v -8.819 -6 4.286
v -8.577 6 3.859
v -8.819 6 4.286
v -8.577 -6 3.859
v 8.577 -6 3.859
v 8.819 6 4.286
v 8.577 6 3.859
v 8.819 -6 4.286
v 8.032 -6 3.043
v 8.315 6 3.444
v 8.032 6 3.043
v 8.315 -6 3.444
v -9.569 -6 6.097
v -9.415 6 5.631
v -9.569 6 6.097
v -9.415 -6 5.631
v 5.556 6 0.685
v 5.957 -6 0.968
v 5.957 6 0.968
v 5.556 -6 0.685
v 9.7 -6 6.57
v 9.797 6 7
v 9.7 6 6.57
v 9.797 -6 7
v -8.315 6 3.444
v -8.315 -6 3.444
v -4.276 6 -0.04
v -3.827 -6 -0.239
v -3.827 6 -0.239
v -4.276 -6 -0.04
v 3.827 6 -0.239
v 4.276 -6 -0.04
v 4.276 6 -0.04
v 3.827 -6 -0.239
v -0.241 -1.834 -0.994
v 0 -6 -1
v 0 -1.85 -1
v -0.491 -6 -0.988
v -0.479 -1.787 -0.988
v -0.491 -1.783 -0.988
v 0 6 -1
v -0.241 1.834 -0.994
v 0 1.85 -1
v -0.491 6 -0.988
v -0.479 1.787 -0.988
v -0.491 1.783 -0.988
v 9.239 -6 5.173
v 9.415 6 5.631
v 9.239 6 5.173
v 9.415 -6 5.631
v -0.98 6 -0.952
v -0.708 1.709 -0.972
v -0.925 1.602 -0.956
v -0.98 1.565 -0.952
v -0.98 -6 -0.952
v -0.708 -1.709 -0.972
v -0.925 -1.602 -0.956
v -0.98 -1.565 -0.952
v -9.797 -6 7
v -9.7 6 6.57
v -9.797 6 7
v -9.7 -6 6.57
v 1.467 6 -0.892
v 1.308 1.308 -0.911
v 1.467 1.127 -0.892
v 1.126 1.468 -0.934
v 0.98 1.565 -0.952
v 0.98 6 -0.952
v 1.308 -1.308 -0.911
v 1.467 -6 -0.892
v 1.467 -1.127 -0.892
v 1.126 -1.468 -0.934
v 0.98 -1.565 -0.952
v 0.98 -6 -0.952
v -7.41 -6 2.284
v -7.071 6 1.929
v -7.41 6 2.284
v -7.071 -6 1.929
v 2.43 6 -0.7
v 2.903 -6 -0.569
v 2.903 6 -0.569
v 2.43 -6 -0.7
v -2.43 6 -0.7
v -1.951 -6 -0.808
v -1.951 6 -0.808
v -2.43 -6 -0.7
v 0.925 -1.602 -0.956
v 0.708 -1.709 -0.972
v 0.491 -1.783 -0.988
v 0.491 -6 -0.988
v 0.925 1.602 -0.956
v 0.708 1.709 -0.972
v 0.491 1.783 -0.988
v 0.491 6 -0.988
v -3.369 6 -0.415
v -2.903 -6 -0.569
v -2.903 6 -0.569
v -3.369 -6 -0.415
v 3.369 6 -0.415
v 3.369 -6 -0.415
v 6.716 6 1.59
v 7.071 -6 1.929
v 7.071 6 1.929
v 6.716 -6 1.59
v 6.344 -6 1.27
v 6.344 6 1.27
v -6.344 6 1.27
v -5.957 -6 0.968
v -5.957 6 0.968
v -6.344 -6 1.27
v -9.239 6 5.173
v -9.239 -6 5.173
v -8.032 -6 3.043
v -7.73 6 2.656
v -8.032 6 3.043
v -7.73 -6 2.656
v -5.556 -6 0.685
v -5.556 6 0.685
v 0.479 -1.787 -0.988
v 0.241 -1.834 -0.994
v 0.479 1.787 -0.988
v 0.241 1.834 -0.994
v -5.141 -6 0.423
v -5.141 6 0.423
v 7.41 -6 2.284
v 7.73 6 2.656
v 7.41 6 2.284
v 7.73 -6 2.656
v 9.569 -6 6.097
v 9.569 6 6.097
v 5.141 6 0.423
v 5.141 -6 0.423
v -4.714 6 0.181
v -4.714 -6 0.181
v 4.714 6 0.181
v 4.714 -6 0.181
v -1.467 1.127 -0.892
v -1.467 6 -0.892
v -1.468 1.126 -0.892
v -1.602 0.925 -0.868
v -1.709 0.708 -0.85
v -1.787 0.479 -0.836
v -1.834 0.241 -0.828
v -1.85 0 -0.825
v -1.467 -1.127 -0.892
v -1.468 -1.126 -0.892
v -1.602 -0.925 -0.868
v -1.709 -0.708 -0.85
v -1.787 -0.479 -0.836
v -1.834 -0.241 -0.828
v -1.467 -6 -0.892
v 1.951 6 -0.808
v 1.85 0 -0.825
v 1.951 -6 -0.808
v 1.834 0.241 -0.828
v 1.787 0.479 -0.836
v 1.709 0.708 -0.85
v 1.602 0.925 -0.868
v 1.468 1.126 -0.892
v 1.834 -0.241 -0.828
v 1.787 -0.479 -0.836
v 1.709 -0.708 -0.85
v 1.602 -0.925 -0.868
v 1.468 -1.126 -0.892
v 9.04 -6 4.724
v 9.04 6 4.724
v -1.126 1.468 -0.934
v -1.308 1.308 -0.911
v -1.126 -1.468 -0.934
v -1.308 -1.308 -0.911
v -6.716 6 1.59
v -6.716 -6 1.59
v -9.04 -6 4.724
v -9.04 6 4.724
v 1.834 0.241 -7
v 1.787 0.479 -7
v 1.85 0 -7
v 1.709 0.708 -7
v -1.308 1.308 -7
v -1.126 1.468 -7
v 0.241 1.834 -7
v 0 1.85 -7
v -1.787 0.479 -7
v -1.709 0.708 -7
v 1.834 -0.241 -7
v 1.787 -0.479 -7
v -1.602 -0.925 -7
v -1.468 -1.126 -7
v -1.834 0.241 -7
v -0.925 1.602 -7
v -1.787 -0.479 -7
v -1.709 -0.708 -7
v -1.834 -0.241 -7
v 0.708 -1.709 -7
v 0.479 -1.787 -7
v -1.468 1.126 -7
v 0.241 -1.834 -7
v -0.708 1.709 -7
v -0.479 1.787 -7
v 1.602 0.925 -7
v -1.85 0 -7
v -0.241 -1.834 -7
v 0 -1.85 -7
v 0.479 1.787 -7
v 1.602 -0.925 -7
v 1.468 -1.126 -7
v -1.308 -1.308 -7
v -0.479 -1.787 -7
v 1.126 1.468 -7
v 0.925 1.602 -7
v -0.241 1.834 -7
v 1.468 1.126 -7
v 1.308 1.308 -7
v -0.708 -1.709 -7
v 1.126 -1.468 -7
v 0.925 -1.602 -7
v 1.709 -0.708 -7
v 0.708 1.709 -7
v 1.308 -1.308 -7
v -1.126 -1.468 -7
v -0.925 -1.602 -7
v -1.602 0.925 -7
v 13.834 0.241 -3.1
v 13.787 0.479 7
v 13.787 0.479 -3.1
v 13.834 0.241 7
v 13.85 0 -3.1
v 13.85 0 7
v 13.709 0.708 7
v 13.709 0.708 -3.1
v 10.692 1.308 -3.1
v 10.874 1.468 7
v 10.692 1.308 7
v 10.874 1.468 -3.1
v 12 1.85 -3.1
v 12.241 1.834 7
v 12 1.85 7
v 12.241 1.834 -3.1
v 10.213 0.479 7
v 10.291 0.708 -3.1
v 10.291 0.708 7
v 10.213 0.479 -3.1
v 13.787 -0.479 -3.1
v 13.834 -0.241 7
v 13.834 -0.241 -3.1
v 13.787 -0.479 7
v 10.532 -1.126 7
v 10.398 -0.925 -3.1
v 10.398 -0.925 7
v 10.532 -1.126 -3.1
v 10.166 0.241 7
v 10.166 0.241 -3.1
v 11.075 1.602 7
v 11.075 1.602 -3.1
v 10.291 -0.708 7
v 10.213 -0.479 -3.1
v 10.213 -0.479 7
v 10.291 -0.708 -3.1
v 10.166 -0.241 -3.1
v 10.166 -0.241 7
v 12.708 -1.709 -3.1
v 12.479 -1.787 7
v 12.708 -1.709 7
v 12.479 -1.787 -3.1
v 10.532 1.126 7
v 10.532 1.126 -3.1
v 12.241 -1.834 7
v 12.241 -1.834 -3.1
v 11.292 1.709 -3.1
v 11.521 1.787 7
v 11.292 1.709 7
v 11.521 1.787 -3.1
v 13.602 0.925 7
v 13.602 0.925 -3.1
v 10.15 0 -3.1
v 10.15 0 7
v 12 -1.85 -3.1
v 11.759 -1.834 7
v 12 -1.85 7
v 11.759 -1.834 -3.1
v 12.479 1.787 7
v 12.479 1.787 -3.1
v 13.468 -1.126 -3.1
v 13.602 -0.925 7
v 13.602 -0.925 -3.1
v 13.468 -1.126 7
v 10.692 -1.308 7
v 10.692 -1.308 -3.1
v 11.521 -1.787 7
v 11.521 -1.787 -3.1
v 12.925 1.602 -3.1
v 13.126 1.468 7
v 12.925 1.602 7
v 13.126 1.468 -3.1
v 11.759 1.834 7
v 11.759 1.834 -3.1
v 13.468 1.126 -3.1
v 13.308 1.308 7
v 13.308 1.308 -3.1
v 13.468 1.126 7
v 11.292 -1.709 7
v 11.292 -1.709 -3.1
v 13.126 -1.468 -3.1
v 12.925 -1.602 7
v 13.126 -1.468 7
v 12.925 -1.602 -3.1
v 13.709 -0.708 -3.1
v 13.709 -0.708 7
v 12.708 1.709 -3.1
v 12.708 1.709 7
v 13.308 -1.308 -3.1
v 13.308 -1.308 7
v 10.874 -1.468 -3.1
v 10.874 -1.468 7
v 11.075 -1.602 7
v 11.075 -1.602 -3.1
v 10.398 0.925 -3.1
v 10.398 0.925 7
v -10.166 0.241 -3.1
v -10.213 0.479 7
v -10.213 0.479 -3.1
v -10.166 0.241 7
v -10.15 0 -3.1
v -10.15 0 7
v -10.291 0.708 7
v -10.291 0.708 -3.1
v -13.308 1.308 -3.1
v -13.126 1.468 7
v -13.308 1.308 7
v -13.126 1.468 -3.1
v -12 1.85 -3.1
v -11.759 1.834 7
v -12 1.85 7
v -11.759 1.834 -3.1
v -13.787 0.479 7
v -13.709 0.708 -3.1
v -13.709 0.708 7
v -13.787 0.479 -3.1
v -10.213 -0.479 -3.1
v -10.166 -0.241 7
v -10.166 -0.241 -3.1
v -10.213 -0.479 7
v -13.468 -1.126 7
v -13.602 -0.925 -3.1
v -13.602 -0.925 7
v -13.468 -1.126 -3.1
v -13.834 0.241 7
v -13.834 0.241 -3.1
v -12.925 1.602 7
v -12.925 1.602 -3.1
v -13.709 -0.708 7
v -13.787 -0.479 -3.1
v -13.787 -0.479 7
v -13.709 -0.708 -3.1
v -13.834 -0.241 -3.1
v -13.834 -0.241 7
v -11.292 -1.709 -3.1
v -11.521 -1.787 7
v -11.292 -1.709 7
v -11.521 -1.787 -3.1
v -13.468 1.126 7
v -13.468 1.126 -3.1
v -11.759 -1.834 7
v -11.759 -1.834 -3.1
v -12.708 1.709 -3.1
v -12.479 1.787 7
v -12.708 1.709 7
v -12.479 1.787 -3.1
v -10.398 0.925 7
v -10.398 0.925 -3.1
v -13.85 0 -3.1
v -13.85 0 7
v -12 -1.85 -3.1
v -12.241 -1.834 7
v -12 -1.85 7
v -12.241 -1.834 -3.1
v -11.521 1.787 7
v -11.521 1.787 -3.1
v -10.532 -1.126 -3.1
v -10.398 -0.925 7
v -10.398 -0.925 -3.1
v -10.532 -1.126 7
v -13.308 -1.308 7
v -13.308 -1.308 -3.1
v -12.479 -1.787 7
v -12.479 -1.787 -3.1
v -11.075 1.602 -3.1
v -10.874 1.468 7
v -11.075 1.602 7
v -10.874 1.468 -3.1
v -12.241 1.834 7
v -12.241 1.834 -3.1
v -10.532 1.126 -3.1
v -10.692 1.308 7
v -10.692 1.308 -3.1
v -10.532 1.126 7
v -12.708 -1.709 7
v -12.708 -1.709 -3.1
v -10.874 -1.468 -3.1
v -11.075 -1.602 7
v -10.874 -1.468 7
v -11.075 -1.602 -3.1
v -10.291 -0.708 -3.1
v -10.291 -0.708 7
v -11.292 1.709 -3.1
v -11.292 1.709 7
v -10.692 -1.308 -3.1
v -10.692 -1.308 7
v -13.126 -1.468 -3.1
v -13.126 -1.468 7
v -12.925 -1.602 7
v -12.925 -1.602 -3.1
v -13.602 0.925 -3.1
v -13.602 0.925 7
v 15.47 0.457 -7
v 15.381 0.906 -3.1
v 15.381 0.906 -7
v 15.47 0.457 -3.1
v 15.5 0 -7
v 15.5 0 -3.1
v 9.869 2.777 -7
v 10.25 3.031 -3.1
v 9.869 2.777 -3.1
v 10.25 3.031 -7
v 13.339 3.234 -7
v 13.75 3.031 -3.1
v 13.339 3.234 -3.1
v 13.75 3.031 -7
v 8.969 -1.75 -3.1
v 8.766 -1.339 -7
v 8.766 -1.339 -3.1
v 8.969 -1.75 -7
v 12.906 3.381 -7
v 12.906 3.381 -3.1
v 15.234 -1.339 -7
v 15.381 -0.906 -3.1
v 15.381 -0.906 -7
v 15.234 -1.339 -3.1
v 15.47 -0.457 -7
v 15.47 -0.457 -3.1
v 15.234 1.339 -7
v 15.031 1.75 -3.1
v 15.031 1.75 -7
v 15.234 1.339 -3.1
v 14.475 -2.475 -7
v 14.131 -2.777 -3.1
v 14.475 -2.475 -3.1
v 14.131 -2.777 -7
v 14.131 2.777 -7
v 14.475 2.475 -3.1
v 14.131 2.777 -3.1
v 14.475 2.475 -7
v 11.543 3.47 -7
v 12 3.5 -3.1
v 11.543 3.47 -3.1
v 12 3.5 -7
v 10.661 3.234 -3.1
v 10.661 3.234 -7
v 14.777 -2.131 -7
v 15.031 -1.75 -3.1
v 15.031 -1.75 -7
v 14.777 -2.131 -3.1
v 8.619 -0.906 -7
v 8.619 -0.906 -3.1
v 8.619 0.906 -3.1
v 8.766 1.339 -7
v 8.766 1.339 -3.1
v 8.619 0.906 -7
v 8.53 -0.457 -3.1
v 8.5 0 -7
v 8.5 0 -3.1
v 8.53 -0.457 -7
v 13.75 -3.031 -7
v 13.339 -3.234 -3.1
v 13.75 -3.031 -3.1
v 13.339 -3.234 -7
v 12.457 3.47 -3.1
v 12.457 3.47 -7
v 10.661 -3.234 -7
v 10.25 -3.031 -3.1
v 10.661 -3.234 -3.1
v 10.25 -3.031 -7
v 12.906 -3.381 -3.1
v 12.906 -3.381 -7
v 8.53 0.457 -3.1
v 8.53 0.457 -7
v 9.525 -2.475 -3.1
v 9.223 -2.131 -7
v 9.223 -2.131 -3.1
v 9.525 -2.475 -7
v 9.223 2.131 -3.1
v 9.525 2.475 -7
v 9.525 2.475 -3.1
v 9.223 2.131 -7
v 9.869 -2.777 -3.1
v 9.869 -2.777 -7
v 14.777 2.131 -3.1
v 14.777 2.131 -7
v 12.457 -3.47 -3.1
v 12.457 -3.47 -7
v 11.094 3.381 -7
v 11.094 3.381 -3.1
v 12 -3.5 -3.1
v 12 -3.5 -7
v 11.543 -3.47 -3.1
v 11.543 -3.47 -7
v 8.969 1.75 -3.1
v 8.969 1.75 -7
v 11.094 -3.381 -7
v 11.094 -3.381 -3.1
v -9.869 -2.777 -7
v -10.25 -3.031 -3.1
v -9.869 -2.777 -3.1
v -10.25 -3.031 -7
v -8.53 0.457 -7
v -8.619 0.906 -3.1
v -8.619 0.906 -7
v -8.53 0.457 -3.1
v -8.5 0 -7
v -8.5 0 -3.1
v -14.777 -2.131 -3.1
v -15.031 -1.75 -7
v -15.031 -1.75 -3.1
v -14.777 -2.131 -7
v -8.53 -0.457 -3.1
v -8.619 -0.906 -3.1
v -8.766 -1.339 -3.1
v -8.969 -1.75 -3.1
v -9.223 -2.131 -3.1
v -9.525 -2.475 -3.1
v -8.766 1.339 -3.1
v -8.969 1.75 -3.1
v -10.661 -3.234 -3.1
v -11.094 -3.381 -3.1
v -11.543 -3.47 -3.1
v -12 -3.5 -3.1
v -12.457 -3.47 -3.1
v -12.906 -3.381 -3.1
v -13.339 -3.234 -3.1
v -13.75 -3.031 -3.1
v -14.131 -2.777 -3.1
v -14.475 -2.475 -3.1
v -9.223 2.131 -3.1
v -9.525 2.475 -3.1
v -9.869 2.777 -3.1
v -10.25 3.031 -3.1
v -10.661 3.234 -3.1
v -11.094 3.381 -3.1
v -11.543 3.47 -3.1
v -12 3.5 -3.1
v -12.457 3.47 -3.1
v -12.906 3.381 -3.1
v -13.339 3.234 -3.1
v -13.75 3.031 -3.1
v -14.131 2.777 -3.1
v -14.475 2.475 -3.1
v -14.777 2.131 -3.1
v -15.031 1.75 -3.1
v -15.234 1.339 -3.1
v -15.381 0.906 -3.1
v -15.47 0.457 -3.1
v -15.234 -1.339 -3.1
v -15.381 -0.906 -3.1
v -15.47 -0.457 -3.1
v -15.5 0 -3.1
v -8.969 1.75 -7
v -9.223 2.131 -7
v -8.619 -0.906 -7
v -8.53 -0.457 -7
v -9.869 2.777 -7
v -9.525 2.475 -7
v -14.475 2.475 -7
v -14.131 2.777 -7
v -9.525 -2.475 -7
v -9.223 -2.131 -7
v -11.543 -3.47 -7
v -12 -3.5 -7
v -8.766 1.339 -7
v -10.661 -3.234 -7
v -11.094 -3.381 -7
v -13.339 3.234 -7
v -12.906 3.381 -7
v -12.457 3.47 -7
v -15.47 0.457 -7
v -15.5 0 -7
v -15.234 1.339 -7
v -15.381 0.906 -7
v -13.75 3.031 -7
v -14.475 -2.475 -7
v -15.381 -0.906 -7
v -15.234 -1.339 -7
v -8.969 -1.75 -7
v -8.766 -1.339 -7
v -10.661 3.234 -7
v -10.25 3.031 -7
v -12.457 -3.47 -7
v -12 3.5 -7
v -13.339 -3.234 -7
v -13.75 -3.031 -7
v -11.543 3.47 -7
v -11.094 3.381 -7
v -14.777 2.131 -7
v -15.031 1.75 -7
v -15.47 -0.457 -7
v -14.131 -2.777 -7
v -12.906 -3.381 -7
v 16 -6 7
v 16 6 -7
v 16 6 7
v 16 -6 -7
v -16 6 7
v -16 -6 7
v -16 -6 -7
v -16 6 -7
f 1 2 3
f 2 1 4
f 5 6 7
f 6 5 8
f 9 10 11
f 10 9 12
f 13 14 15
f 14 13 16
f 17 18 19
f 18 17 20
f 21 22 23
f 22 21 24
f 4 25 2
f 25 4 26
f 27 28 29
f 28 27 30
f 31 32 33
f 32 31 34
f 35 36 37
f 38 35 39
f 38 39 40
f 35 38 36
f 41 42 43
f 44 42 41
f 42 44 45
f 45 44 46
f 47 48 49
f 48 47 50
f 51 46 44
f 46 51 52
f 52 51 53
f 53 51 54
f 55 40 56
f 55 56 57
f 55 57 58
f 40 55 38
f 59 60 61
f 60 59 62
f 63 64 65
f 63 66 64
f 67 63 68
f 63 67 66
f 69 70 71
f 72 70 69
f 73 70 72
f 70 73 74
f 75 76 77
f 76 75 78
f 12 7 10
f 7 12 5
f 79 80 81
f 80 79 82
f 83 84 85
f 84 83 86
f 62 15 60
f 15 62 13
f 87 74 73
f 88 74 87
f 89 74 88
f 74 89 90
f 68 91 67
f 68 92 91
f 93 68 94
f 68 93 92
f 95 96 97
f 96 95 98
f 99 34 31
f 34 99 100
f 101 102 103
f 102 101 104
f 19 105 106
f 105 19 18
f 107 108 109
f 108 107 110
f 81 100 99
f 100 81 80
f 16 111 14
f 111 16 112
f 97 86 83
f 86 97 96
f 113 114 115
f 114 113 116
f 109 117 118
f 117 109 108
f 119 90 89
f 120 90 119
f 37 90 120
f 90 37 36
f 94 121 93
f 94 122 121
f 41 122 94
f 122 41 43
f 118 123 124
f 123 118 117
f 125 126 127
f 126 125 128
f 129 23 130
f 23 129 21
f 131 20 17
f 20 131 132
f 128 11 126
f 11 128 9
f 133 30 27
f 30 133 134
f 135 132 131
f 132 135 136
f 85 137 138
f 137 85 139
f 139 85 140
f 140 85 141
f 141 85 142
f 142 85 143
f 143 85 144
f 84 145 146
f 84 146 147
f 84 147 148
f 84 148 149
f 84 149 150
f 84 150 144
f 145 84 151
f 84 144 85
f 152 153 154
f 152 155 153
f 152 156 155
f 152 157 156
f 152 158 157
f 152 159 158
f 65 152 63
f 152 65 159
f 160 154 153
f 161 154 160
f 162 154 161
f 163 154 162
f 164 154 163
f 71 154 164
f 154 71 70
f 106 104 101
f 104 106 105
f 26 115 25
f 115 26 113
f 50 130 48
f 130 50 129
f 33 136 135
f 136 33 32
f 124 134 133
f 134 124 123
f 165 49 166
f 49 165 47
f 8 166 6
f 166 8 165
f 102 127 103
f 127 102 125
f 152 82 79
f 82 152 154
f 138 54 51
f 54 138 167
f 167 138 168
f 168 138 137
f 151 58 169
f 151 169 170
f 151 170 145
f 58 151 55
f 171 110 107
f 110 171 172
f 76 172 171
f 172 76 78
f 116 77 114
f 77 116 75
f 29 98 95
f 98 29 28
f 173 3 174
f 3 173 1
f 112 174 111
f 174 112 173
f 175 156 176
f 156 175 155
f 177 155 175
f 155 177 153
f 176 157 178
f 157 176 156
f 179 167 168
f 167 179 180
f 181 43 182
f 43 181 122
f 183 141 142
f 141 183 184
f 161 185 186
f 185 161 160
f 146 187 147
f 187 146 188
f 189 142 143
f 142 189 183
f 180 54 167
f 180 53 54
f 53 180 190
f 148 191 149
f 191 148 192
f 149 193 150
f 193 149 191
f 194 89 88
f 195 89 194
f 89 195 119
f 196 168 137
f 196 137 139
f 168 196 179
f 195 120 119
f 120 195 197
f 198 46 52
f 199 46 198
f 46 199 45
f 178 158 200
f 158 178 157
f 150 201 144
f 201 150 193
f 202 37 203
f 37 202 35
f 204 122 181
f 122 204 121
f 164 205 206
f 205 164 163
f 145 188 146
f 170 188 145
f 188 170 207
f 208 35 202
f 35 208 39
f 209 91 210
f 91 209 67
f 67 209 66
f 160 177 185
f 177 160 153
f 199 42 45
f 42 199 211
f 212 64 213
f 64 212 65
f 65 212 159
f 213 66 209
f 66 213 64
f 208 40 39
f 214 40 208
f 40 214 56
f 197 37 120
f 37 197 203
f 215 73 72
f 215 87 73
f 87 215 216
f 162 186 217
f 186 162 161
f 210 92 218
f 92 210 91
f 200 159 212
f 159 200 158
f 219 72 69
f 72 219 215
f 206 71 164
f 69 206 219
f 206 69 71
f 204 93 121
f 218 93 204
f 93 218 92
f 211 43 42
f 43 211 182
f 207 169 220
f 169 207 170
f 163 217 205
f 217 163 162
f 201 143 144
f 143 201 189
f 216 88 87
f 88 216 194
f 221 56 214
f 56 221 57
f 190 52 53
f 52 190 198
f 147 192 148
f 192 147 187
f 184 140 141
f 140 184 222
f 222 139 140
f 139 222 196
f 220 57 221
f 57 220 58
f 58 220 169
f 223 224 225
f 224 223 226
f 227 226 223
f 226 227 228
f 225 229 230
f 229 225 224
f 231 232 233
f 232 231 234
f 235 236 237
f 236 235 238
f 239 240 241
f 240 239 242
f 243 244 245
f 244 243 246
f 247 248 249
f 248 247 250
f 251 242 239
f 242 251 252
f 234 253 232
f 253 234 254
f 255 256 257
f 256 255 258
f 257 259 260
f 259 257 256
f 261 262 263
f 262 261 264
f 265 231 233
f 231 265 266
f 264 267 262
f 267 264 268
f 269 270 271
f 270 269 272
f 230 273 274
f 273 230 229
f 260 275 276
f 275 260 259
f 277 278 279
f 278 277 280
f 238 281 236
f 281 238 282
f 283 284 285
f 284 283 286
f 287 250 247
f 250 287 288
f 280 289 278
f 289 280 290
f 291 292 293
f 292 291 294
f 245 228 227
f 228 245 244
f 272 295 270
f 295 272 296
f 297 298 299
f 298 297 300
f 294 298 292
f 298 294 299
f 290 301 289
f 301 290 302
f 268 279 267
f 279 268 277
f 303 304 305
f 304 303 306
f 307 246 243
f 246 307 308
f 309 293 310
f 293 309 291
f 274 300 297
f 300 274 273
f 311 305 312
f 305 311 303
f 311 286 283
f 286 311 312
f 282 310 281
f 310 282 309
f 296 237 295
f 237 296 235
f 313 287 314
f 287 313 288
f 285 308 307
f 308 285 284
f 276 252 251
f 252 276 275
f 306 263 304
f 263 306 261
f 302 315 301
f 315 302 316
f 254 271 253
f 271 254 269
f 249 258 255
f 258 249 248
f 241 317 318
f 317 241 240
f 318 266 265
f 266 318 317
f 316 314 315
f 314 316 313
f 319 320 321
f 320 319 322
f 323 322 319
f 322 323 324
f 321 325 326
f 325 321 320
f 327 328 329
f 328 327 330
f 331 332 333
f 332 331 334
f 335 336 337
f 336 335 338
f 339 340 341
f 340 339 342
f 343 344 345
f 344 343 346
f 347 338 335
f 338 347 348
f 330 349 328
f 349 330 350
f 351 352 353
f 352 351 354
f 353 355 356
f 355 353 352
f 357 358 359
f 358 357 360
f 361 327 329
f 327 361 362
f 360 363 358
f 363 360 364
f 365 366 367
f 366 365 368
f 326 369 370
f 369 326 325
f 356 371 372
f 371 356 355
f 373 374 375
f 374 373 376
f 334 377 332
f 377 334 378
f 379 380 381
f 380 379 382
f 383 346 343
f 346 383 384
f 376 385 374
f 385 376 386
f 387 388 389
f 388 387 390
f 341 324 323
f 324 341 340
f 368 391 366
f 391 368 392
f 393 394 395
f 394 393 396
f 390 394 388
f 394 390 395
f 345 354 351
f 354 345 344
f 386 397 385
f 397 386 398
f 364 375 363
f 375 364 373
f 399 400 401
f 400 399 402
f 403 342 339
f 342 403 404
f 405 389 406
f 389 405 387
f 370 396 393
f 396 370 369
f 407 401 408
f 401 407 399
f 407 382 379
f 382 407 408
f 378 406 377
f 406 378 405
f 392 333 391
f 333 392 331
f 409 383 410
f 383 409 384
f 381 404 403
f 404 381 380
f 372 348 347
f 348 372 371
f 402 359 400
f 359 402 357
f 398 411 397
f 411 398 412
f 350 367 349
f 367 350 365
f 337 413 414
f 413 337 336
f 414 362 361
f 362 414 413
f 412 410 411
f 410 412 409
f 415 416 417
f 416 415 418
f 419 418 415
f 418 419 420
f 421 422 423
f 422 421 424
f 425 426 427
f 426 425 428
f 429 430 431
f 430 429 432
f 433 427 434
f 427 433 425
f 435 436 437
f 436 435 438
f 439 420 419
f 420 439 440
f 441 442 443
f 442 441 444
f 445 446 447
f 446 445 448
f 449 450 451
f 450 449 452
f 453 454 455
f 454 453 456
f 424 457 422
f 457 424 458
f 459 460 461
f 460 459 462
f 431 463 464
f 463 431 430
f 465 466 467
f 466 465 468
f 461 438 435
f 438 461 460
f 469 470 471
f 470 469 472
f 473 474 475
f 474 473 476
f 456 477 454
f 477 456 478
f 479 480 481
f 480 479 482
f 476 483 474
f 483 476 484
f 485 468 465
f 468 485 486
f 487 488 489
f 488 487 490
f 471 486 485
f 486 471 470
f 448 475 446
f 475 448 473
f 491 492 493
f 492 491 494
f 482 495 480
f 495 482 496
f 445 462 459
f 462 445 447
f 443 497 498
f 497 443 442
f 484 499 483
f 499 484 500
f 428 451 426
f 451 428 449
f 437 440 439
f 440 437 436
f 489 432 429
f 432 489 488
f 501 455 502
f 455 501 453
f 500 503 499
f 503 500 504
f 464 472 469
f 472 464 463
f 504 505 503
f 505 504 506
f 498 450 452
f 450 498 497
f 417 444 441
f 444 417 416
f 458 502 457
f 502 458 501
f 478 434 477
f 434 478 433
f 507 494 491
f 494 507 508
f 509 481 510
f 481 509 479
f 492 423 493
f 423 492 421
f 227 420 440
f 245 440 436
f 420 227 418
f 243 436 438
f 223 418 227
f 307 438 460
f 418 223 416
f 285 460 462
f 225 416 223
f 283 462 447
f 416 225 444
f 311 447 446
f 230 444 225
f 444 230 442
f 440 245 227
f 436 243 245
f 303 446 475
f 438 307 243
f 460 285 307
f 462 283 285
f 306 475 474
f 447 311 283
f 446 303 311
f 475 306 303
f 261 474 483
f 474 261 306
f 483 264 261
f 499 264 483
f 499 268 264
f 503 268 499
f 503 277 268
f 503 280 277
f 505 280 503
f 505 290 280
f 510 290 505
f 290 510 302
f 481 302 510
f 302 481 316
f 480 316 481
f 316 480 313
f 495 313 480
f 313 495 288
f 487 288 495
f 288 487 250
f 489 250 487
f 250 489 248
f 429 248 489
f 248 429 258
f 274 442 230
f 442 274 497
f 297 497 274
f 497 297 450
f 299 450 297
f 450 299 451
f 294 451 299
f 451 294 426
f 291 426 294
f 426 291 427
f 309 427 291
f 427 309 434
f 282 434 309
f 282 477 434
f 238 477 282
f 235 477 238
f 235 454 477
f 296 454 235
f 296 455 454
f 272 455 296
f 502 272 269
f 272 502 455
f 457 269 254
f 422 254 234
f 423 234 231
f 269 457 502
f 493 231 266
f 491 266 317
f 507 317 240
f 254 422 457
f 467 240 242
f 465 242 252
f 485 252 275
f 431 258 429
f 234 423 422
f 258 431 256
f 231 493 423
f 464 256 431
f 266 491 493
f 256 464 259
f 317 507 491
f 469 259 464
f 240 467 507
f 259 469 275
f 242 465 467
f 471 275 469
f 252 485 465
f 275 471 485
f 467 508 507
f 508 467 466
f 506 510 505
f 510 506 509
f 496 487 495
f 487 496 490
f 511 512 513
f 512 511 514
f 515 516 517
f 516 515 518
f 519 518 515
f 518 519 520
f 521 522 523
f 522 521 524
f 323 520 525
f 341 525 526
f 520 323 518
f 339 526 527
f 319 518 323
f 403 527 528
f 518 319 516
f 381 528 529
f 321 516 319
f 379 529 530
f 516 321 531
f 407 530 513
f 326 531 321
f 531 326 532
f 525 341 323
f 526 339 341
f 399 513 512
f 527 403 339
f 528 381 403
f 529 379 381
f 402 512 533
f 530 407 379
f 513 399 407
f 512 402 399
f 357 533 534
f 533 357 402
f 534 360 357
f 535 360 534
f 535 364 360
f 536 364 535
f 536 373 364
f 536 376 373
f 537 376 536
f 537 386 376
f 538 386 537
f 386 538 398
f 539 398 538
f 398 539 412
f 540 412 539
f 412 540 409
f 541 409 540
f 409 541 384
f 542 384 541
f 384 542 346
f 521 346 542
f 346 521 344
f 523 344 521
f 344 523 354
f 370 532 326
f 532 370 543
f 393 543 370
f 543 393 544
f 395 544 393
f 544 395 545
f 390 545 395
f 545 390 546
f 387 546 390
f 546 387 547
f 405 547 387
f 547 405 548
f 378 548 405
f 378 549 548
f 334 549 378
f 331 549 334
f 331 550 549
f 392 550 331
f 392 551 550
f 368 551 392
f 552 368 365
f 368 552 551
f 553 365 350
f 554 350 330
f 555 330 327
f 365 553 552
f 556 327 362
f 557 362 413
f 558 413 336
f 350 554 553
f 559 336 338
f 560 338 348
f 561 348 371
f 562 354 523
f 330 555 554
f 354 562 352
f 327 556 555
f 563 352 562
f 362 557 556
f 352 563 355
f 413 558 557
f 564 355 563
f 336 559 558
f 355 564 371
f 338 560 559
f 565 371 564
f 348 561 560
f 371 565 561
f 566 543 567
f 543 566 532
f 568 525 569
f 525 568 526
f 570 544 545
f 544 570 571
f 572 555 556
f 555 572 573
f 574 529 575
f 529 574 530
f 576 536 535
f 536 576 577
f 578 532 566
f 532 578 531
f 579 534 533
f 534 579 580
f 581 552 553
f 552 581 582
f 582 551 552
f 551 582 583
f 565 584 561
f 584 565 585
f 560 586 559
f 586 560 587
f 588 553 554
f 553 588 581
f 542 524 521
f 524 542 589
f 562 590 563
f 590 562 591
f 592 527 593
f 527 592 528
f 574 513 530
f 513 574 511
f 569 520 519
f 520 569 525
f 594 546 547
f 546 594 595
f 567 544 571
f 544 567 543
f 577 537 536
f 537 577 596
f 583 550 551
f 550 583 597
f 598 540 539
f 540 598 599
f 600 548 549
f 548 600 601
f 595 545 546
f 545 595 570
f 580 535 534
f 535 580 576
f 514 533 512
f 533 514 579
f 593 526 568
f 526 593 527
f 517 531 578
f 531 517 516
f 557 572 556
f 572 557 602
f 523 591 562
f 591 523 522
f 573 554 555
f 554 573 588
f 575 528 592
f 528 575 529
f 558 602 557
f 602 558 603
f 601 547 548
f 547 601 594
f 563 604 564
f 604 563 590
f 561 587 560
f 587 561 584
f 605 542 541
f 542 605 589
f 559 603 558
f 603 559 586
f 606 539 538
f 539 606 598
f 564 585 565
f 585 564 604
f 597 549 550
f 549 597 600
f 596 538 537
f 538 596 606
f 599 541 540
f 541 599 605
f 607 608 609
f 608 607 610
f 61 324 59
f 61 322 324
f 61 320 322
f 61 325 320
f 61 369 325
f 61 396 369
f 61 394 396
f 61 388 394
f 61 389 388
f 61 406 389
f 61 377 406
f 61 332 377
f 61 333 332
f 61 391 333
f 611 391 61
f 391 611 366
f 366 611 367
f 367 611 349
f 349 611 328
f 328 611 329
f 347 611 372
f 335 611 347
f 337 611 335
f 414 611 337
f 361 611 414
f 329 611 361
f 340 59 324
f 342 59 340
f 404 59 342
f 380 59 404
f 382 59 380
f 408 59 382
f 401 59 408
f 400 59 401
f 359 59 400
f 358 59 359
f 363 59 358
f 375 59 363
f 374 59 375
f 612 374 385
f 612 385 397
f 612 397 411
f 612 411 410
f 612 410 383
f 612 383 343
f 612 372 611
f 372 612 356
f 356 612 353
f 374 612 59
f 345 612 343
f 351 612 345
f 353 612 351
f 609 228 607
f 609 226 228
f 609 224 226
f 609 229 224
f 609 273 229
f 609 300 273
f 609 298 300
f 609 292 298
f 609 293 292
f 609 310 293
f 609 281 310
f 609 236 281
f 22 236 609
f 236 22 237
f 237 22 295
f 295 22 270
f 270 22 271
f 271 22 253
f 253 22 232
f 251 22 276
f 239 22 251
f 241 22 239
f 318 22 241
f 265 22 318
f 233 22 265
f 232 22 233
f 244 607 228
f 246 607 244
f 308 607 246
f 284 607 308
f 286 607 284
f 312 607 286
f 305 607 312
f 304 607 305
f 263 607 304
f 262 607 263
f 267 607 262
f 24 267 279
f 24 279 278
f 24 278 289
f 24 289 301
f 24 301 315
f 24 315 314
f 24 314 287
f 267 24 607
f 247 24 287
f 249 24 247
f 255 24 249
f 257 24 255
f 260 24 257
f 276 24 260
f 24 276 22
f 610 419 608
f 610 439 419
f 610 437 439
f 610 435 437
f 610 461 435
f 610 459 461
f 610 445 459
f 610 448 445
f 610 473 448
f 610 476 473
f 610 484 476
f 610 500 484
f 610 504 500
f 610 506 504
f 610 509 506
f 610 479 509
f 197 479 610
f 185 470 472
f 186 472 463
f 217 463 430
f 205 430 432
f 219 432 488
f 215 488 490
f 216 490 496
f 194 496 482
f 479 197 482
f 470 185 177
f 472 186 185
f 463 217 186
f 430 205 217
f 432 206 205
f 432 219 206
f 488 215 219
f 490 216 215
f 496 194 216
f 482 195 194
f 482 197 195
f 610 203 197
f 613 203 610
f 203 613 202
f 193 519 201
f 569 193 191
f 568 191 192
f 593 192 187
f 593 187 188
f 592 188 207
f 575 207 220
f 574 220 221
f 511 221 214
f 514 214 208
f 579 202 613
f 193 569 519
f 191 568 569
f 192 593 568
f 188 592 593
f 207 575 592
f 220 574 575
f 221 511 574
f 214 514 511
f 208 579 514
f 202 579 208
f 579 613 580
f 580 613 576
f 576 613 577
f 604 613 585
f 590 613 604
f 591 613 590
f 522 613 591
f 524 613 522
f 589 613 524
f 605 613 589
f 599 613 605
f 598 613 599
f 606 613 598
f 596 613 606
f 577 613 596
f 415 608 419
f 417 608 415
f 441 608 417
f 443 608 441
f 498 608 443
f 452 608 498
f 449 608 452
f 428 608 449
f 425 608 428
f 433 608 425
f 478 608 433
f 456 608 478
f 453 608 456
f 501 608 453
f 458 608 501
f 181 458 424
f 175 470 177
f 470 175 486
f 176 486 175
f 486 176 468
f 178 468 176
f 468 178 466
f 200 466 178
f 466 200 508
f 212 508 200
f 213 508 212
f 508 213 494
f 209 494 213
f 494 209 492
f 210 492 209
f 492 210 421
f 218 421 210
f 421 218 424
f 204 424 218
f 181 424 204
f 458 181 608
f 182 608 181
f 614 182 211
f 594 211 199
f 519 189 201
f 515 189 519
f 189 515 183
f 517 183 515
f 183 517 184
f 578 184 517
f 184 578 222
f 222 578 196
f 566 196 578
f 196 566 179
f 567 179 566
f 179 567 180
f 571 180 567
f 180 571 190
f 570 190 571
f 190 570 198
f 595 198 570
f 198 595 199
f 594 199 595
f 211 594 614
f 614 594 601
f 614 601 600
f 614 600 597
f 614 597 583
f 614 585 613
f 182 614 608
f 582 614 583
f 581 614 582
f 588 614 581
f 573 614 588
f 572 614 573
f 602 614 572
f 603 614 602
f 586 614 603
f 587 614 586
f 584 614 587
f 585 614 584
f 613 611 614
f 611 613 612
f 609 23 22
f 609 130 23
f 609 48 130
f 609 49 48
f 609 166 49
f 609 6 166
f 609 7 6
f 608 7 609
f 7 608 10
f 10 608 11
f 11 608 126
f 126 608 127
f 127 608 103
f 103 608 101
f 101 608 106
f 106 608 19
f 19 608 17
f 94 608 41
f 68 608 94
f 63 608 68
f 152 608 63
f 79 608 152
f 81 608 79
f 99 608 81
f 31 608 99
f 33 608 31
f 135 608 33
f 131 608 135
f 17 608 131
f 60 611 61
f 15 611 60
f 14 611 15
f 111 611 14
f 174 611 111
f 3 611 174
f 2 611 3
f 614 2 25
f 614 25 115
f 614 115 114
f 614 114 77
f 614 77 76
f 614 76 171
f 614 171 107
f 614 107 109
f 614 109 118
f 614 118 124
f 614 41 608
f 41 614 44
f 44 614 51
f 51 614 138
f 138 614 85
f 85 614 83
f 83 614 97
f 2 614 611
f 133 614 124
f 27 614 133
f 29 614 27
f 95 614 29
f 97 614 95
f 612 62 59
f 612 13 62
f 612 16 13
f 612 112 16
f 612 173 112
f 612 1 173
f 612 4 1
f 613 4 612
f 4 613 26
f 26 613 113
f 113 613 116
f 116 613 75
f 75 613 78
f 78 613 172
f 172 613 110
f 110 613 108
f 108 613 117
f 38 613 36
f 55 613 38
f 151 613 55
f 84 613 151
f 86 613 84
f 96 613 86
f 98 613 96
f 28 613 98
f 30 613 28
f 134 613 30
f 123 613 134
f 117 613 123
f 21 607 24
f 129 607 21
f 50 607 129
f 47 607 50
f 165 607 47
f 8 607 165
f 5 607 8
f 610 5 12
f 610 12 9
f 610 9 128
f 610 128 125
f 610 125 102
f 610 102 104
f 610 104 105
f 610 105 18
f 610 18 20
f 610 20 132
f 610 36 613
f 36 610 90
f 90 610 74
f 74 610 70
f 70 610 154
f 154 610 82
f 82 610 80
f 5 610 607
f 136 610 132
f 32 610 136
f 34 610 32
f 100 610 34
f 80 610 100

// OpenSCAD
module clamp_body()
{
screw_hole_r=1.85; // for 3.5mm screws
screw_head_r=3.5;
  difference()
    {
      cube([32,12,14], center=true);  
   
   #union()
      {
      translate([0,0,9])
        // main notch for spar
        rotate(90,[1,0,0])
        cylinder(h=50, r=10, center=true,$fn=128);

      // centre hole for bolting through spar
      cylinder(h=40,r=screw_hole_r,center=true,$fn=48);

      // Holes along side rails for bolting alongside spar
      translate([12,0,-20])
      cylinder(h=40,r=screw_hole_r,centre=true,$fn=48);
      translate([-12,0,-20])
      cylinder(h=40,r=screw_hole_r,centre=true,$fn=48);

      // Screw head holes (wider than screw holes)
      translate([12,0,-7.1])
      cylinder(h=4,r=screw_head_r,centre=true,$fn=48);
      translate([-12,0,-7.1])
      cylinder(h=4,r=screw_head_r,centre=true,$fn=48);

    }
  }
 
}



clamp_body();
